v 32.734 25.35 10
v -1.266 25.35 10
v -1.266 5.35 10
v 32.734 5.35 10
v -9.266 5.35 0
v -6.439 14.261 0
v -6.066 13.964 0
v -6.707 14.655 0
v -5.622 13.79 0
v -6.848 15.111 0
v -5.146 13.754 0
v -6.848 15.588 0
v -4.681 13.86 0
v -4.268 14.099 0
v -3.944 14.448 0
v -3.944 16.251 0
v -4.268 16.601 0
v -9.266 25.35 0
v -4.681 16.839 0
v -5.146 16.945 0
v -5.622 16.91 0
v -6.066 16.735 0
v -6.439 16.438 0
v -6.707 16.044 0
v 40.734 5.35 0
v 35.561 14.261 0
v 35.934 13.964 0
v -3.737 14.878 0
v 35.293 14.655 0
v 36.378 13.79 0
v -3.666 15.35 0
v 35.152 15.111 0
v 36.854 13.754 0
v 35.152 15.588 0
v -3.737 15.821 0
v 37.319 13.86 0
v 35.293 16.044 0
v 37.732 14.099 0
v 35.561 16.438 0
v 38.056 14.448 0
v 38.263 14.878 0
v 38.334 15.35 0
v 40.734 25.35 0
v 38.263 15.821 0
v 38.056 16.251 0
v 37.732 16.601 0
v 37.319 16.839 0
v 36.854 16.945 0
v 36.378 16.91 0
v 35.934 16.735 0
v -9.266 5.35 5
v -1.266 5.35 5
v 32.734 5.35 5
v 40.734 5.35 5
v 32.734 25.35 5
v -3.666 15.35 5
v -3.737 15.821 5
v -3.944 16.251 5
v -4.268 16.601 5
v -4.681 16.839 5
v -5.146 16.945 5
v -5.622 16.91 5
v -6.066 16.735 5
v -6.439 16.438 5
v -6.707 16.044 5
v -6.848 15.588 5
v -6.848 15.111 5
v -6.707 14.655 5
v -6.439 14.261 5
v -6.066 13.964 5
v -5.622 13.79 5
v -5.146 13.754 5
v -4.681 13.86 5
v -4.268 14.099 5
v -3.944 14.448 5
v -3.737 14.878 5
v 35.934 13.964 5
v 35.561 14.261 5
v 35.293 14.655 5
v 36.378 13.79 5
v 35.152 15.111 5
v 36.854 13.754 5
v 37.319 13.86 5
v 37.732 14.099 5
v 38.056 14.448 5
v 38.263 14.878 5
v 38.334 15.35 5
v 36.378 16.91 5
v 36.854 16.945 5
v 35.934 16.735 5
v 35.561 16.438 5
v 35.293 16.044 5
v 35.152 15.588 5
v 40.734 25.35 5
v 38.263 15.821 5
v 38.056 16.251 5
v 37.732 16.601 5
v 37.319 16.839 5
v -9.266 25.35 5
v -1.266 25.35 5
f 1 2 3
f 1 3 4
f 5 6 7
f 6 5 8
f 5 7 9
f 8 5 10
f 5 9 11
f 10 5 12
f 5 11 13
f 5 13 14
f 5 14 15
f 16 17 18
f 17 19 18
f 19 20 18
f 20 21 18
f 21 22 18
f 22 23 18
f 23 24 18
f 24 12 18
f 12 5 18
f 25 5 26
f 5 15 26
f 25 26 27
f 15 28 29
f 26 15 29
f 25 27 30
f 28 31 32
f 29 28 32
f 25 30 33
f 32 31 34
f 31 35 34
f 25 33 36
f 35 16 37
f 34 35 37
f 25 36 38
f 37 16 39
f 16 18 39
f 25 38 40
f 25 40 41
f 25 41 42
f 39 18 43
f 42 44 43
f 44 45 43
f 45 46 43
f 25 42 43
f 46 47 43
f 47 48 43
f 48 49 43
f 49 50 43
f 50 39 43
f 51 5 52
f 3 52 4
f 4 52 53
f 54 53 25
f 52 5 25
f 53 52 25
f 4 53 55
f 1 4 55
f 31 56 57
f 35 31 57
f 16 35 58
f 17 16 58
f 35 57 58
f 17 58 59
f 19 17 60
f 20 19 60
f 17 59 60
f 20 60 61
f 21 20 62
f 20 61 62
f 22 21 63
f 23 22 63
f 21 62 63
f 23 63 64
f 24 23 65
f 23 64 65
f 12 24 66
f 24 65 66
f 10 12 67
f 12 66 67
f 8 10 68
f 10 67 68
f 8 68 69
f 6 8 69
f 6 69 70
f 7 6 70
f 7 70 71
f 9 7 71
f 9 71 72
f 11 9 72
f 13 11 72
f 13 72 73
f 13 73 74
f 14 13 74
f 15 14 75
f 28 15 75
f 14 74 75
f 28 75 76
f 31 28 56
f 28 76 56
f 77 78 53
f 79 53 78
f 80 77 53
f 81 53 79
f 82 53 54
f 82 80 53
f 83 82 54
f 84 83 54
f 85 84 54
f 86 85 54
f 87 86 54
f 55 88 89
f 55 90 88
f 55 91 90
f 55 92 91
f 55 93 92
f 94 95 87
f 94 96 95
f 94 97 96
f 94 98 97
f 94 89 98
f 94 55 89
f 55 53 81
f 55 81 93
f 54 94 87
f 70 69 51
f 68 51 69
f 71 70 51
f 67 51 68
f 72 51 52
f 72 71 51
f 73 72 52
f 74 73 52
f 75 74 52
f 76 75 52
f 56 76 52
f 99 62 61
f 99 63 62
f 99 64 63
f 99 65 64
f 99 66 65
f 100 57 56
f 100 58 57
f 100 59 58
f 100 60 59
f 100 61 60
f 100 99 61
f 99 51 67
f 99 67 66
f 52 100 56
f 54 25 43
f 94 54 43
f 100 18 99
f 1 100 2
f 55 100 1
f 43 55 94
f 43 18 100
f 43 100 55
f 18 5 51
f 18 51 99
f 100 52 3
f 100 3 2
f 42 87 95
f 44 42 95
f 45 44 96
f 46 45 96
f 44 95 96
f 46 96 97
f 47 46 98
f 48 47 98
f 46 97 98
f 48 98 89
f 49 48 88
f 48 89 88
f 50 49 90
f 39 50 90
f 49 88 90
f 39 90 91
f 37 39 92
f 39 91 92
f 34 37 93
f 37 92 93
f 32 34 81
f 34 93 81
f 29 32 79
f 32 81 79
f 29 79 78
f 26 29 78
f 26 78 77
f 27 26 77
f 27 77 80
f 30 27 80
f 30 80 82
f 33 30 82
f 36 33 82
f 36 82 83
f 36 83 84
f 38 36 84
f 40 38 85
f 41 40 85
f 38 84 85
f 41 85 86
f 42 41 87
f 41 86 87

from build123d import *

# Parameters (mm, degrees)
SKETCH_1_W          = 50
SKETCH_1_H          = 20
EXTRUDE_1_DEPTH     = 5
SKETCH_2_W          = 34
SKETCH_2_H          = 20
EXTRUDE_2_DEPTH     = 5
SKETCH_3_R          = 1.6
CUT_EXTRUDE_1_DEPTH = 5


with BuildPart() as part:
    # 草图1 → 凸台-拉伸1 (new body)
    with BuildSketch(Plane.XY):
        with Locations((15.734265734, 15.34965035)):
            Rectangle(SKETCH_1_W, SKETCH_1_H)
    extrude(amount=EXTRUDE_1_DEPTH)

    # 草图2 → 凸台-拉伸2 (add)
    with BuildSketch(Plane.XY.offset(5)):
        with Locations((15.734265734, 15.34965035)):
            Rectangle(SKETCH_2_W, SKETCH_2_H)
    extrude(amount=EXTRUDE_2_DEPTH)

    # 草图3 → 切除-拉伸1 (cut)
    with BuildSketch(Plane.XY.offset(5)):
        with Locations((-5.265734266, 15.34965035)):
            Circle(SKETCH_3_R)
        with Locations((36.734265734, 15.34965035)):
            Circle(SKETCH_3_R)
    extrude(amount=-CUT_EXTRUDE_1_DEPTH, mode=Mode.SUBTRACT)


solid = part.part
